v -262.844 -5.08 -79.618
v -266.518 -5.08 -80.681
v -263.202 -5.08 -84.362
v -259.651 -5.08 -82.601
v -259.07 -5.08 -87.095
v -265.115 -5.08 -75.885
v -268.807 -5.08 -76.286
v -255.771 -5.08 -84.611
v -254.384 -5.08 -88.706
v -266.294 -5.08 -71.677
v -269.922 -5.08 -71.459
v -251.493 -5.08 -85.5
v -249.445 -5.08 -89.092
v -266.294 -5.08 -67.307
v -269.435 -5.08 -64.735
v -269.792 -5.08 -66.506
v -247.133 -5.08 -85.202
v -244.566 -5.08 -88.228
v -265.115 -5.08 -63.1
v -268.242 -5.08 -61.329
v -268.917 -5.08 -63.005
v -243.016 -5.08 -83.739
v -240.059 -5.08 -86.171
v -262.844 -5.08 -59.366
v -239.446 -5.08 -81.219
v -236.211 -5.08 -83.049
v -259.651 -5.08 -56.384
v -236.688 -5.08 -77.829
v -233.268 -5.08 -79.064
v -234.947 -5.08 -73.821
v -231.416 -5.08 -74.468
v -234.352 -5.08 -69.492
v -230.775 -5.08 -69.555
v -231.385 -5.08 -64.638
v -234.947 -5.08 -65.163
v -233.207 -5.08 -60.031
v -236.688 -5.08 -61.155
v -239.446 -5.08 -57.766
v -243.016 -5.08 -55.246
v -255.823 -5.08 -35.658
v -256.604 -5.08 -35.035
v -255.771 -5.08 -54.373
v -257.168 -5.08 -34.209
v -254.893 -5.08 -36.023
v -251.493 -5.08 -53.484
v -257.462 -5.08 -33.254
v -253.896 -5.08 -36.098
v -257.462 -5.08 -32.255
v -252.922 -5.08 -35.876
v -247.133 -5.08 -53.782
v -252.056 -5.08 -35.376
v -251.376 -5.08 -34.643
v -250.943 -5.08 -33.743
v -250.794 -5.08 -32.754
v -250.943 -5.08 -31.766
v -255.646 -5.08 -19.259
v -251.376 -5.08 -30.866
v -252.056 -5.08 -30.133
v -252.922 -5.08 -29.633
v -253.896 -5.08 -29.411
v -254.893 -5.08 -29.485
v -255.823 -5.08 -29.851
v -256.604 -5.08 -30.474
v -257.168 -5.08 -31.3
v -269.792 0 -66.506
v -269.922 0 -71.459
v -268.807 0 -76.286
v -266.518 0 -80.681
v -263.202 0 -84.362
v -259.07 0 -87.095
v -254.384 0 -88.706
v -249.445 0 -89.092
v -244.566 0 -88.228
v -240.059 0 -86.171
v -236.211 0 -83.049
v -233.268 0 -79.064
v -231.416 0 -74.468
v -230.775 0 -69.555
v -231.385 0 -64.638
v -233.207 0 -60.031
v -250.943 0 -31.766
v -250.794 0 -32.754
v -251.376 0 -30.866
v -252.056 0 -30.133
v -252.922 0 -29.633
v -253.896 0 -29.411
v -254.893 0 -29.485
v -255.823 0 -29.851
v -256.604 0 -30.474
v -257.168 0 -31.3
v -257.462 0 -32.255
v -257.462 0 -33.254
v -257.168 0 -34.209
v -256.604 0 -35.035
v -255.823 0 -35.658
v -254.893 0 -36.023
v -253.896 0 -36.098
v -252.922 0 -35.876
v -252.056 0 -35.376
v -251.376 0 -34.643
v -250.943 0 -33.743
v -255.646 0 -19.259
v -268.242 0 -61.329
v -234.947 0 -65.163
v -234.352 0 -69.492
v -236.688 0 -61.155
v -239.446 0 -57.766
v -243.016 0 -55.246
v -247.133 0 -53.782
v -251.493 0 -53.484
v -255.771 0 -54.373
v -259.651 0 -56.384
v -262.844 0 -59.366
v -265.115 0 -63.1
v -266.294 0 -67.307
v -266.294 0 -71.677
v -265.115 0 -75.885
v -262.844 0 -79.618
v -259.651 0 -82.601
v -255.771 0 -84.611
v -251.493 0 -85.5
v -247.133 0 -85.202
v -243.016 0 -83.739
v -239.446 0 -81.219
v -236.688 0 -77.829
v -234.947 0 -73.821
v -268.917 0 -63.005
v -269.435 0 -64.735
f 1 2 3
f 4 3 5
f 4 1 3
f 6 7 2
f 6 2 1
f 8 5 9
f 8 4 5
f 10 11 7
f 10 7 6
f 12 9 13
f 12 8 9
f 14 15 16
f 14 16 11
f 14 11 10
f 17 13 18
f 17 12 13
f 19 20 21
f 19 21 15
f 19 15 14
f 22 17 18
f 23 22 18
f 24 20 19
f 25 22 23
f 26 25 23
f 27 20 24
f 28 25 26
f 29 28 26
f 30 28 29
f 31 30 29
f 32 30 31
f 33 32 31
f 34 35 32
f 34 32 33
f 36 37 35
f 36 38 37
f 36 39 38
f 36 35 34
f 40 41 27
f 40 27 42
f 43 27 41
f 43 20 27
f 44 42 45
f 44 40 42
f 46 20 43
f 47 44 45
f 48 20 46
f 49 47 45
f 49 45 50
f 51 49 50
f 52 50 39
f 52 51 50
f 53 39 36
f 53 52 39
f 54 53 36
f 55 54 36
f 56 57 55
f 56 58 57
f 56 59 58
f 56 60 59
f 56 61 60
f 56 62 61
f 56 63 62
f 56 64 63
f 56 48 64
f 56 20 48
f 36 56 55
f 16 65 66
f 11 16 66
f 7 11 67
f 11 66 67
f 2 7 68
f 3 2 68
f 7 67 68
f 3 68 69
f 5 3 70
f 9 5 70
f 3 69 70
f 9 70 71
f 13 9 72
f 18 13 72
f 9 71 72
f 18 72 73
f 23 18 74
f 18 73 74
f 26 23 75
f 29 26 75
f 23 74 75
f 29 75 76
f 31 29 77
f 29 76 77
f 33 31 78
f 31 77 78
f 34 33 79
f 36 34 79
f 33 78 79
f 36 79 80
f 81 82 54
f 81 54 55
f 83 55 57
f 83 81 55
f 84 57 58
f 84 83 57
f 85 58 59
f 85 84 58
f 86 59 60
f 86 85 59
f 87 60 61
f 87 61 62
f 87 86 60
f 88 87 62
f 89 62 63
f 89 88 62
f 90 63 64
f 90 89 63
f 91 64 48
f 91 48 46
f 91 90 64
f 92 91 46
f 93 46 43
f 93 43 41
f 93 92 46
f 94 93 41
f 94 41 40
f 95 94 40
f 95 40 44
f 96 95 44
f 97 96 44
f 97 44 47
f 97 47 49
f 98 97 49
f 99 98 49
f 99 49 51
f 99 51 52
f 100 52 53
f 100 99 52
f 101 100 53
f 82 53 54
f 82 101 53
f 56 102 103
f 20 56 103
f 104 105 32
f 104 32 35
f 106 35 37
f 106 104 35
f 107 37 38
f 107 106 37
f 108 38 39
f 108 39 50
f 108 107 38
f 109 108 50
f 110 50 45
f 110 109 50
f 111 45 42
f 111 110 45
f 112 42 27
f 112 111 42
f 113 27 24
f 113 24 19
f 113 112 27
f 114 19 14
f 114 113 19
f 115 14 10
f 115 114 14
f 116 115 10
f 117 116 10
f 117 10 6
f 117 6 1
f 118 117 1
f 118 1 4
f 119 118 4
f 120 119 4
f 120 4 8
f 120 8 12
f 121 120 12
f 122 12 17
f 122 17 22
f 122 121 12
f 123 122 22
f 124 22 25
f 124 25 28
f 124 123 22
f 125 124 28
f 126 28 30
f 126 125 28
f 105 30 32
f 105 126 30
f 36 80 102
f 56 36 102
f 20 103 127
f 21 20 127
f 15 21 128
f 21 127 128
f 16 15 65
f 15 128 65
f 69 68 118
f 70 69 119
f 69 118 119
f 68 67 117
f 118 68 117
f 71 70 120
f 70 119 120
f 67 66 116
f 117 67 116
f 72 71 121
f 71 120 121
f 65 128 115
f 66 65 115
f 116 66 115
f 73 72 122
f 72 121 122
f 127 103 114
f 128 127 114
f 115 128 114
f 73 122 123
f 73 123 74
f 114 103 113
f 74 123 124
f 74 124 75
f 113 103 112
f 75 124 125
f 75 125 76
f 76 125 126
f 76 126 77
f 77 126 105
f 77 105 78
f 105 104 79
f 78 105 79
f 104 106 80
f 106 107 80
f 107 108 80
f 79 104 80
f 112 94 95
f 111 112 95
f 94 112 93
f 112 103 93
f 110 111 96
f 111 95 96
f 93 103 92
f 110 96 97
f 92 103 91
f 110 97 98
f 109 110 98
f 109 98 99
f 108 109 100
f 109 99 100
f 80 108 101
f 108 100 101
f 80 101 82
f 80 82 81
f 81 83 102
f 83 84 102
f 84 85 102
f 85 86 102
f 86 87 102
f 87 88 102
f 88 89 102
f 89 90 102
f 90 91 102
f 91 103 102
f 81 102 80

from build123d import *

# Parameters (mm, degrees)
F0_R     = 16.045413
F0_R_2   = 3.352999
F1_DEPTH = 5.08


with BuildPart() as f1:
    # F0 (on Front) → F1 (new body)
    with BuildSketch(Plane.XZ):
        with BuildLine():
            Line((-269.792154, -66.505959), (-268.242146, -61.329008))
            ThreePointArc((-268.242146, -61.329008), (-269.196215, -63.86387), (-269.792154, -66.505959))
        make_face()
        with BuildLine():
            Line((-255.64608, -19.258766), (-268.242146, -61.329008))
            Line((-268.242146, -61.329008), (-269.792154, -66.505959))
            ThreePointArc((-269.792154, -66.505959), (-246.977926, -88.814828), (-233.206555, -60.030735))
            Line((-233.206555, -60.030735), (-255.64608, -19.258766))
        make_face()
        with Locations((-250.397801, -69.492221)):
            Circle(F0_R, mode=Mode.SUBTRACT)
        with Locations((-254.146576, -32.754317)):
            Circle(F0_R_2, mode=Mode.SUBTRACT)
    extrude(amount=F1_DEPTH)


solid = f1.part
